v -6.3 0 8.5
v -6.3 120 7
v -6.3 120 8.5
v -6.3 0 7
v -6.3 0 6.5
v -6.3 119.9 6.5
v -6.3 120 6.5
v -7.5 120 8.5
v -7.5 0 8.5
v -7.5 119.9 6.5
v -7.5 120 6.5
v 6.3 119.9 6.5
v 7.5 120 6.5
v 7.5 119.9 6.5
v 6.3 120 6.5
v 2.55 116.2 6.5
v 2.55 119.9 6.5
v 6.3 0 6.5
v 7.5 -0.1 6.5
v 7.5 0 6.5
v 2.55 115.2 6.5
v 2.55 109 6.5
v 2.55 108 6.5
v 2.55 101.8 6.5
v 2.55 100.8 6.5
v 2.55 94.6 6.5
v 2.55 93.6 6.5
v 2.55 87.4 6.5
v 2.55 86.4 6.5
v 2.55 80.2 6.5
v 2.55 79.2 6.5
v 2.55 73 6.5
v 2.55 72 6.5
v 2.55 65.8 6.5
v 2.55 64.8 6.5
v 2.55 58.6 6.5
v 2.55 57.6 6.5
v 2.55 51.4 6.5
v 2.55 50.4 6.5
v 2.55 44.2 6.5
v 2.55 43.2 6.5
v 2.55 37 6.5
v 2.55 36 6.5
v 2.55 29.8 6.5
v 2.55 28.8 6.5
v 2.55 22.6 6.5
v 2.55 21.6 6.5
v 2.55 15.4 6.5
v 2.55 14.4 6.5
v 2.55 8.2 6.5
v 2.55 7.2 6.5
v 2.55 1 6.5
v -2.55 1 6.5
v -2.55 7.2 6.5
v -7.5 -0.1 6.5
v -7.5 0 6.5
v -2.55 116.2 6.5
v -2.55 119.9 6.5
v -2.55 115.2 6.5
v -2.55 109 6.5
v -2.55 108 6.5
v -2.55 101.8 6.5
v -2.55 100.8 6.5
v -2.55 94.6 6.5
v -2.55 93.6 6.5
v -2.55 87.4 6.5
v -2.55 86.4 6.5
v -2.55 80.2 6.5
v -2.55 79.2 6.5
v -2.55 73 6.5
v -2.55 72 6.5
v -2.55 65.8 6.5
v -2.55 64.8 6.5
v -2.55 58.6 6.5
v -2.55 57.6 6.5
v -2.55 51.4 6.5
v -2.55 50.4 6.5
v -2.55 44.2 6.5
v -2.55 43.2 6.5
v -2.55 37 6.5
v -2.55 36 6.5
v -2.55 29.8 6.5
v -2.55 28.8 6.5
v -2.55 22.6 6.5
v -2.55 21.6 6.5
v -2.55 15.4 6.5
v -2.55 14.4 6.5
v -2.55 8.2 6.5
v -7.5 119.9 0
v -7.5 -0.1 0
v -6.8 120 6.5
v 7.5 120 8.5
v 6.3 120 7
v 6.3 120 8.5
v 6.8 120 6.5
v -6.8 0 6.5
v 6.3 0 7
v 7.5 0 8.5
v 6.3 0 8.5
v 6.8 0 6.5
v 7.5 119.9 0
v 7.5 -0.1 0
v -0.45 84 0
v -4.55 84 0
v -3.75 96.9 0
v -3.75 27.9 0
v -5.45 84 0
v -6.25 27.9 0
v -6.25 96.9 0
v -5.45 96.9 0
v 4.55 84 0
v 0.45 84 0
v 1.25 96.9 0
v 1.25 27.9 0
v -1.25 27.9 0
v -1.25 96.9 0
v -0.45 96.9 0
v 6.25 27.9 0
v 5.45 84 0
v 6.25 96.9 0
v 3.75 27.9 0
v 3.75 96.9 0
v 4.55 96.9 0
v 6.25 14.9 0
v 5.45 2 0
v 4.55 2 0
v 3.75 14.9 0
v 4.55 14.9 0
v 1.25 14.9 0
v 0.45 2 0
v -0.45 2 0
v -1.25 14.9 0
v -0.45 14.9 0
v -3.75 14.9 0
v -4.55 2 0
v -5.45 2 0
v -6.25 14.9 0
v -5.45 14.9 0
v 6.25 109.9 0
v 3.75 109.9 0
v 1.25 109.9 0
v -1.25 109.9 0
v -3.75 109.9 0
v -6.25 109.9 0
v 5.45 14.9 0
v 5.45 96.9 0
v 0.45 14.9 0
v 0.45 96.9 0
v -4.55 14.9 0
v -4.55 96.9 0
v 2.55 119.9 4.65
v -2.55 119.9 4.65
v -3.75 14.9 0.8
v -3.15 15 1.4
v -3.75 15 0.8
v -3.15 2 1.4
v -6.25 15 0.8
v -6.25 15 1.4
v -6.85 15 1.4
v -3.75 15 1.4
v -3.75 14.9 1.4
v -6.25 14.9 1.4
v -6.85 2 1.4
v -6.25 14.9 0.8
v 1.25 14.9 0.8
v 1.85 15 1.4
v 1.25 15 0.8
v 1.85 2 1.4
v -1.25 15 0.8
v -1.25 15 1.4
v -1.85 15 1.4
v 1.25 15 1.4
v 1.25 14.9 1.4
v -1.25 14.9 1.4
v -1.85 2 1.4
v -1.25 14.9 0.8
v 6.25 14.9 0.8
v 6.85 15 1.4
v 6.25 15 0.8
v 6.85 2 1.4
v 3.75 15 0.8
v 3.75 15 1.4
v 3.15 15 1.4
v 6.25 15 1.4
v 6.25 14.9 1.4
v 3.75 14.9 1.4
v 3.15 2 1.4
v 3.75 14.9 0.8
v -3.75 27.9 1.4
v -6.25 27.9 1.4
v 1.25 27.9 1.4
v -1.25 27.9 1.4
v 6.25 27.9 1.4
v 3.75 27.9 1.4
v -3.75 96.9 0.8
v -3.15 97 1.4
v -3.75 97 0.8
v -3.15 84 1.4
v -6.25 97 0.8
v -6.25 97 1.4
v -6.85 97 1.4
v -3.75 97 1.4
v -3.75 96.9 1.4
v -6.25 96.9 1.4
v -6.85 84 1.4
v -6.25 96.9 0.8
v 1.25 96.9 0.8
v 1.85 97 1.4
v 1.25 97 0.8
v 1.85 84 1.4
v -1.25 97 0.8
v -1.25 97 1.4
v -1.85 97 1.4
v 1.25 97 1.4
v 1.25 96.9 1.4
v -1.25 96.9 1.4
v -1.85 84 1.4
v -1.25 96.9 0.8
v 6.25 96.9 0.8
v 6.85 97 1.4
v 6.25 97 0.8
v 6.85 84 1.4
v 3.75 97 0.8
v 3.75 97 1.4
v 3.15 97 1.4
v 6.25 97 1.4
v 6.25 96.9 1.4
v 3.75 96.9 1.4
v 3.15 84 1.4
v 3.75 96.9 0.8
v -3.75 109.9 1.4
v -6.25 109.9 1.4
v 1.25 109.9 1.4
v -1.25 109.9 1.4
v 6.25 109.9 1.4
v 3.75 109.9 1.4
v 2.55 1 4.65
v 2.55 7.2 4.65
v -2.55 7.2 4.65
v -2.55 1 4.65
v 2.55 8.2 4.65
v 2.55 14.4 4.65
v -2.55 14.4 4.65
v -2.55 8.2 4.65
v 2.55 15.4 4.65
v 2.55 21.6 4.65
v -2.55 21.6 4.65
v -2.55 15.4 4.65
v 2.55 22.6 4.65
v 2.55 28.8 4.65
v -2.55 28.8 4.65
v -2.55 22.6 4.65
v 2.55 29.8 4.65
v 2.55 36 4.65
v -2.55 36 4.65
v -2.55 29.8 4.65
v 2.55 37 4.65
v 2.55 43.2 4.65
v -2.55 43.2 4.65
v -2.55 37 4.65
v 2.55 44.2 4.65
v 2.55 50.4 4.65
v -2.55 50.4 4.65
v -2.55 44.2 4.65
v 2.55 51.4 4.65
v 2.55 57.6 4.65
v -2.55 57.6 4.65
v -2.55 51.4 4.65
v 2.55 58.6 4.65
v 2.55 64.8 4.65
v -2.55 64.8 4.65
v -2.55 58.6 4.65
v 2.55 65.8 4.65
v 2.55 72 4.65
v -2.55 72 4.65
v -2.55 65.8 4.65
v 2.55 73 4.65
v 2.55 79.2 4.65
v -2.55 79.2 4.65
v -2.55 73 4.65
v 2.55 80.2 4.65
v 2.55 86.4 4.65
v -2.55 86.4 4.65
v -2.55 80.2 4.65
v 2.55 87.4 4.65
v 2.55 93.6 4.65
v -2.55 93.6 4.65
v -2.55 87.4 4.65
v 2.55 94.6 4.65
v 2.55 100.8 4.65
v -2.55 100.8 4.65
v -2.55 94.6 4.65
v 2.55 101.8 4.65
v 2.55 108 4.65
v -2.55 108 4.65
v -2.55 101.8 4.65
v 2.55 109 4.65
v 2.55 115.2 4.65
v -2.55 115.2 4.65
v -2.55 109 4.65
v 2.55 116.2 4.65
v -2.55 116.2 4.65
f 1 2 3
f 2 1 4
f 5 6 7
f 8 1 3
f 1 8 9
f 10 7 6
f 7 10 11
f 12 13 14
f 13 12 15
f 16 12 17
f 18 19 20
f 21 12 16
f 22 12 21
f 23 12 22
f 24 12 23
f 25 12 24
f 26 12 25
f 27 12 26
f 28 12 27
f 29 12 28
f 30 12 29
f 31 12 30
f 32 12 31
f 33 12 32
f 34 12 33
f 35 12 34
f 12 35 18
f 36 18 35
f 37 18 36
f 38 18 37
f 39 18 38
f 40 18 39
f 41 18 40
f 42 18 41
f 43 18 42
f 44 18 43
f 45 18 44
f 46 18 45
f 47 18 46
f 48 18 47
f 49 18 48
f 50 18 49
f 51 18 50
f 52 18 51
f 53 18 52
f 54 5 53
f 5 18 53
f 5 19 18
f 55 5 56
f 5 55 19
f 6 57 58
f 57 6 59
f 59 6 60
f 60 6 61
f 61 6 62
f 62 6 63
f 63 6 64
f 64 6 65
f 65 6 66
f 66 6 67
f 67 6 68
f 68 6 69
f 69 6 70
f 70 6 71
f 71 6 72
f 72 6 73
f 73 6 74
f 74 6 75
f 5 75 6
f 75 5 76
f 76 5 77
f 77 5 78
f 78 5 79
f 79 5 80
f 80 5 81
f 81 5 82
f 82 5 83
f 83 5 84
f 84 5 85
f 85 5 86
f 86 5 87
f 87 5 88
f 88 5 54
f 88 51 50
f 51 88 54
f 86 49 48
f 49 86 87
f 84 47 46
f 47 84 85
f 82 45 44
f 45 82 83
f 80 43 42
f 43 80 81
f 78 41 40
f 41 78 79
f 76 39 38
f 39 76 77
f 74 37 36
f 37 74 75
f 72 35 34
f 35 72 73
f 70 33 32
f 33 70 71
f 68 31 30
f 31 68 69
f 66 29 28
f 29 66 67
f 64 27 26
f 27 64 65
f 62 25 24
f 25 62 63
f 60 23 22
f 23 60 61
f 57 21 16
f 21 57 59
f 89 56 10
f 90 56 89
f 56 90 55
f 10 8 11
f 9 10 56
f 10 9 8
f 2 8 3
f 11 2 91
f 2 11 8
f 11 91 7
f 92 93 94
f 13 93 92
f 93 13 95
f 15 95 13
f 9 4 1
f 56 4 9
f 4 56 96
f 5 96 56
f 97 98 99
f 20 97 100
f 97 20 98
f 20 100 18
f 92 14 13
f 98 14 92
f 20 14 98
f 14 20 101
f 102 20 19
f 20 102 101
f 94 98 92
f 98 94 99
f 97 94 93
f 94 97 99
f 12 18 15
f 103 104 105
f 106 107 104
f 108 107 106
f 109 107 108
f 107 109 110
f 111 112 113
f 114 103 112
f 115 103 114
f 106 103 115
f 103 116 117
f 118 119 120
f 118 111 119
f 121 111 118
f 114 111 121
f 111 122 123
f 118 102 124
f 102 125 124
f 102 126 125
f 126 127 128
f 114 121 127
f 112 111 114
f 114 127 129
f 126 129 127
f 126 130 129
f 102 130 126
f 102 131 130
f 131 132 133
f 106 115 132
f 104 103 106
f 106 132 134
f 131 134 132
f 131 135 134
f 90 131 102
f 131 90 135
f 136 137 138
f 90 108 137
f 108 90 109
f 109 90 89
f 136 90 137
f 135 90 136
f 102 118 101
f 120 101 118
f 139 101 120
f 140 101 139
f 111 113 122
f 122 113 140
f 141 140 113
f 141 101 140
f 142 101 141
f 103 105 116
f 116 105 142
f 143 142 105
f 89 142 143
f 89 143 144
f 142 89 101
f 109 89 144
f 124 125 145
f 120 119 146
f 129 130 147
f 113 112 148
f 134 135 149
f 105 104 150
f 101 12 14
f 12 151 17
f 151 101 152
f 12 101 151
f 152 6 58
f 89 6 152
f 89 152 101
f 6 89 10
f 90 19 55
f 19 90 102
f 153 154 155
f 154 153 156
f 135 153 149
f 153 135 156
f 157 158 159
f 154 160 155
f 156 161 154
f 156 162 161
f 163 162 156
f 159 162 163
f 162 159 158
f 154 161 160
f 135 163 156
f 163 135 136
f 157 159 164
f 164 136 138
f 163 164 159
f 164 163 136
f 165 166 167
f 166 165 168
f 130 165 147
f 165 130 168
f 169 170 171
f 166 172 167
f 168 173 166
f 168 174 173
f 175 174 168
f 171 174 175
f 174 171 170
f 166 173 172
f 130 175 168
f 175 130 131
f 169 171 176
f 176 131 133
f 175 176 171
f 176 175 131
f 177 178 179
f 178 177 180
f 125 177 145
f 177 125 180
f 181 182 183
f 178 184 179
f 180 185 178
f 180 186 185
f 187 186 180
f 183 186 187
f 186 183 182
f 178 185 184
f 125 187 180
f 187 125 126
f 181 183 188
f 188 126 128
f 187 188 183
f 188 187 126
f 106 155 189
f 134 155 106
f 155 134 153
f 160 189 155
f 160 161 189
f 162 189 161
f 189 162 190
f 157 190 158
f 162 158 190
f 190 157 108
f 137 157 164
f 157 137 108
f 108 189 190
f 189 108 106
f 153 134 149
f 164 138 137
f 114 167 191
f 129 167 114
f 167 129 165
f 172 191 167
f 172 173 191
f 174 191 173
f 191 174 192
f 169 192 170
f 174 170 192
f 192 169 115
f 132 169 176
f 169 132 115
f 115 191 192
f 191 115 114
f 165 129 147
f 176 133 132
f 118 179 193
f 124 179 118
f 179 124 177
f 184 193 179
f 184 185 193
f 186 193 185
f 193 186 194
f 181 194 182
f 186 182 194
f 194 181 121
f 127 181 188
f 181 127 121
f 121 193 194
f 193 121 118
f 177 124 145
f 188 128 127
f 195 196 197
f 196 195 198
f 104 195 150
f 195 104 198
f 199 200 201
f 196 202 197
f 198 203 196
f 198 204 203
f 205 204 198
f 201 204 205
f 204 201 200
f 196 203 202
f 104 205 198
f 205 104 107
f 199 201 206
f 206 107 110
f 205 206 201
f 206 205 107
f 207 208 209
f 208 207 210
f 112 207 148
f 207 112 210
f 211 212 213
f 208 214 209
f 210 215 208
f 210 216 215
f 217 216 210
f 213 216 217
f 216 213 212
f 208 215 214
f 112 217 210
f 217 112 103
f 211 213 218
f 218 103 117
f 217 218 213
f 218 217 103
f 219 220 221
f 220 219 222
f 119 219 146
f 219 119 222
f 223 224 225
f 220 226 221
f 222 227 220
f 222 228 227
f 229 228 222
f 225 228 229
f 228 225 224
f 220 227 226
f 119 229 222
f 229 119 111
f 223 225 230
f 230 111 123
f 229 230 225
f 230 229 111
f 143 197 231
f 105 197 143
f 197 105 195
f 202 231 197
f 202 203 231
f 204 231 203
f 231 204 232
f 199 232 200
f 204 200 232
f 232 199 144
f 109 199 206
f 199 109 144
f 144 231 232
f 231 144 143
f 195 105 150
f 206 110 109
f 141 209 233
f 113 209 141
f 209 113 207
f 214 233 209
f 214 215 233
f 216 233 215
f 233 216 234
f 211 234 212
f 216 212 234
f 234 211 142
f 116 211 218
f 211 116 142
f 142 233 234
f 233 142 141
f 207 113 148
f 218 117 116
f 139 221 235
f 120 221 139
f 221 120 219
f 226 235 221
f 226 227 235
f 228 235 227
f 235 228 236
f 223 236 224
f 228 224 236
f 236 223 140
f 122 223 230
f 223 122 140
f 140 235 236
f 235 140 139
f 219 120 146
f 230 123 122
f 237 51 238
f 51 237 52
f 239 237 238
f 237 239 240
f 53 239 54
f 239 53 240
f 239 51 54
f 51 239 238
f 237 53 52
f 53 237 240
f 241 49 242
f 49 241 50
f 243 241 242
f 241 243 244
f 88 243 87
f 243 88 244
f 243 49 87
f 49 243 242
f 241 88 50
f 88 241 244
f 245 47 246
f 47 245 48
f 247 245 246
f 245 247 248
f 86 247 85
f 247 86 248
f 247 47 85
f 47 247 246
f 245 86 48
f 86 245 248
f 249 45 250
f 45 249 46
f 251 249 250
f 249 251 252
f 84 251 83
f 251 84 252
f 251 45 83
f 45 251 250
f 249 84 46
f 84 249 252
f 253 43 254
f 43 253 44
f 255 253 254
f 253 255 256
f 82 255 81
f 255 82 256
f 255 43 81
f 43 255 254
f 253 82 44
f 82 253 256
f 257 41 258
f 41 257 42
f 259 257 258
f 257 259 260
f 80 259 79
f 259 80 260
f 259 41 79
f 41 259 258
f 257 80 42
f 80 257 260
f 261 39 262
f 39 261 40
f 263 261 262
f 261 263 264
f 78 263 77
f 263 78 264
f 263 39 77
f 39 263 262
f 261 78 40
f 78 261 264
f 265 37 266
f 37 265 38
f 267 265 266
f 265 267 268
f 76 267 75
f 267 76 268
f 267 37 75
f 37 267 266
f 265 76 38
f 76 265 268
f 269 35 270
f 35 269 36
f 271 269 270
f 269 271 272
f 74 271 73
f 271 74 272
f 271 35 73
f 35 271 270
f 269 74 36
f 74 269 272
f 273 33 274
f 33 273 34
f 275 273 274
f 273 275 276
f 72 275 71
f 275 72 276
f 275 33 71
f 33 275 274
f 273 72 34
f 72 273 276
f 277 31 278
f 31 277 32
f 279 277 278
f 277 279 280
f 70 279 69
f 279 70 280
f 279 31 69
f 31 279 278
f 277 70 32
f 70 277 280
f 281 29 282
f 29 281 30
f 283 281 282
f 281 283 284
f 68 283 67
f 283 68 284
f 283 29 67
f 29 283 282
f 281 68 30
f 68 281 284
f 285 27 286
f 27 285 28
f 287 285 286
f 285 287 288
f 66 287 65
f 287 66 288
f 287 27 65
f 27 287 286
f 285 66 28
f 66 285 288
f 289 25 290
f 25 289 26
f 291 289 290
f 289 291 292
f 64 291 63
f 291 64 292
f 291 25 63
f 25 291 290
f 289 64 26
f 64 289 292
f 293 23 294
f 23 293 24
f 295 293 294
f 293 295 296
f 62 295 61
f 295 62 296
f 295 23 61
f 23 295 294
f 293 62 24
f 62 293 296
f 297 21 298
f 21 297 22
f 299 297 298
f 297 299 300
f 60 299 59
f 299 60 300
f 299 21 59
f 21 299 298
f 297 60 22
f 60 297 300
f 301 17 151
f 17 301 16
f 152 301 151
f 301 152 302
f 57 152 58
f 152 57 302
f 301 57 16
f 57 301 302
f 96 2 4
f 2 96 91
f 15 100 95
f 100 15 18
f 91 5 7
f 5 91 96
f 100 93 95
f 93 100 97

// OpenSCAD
render_lid = false;
render_tray = true;

carrier_width_mm = 15;
carrier_length_mm = 120;
carrier_height_mm = 6.5;

// Set pocket definitions here:
pocket_to_next_mm = 1; // spacing between like pockets
pocket_to_pocket_mm = 1; // spacking between different pockets

// width, length, depth
pockets = [
    [10.5,  7.8, 4.55 + 0.1], // OLP-000049 - 6-SMD DIP
    [8.75,  6.2, 1.75 + 0.1], // OLp-000055 - 14-SOIC
    [ 5.1,  6.2, 1.75 + 0.1], // OLp-000055 - 8-SOIC
];


pocket = pockets[2];
wall_width_mm = 1.2;


// === Dovetail Profile (2D)
module dovetail_profile(dovetail_angle =  45,     // Degrees
                        dovetail_depth =   1,     // Vertical height
                        dovetail_width = 0.5,     // Bottom (narrow) width
                        ) {
    // How much wider top is than bottom
    half_top_extra = dovetail_depth * tan(dovetail_angle);  
    
    polygon([
        [0, 0],
        [dovetail_width, 0],
        [dovetail_width + half_top_extra, dovetail_depth],
        [-half_top_extra, dovetail_depth]
    ]);
}

// === Dovetail Slot
module dovetail(dovetail_length_mm = 12,
                dovetail_angle = 45,      // Degrees
                dovetail_depth = 1.6,       // Vertical height
                dovetail_width = 0.5,      // Bottom (narrow) width
            ) {
    
    translate([-dovetail_width/2,dovetail_length_mm,-0.1])
    rotate([90,0,0])
        linear_extrude(height = dovetail_length_mm)
            dovetail_profile(dovetail_angle,dovetail_depth,dovetail_width);
    
}

module menlu_dovetail() {
    dovetail_length_mm = 13;  // Extrusion thickness (e.g., length of slot)
    dovetail_z_offset_mm = -0.1;
    inter_dovetail_mm = 5;
    

    translate([-inter_dovetail_mm, 0, dovetail_z_offset_mm])
        dovetail(dovetail_length_mm);
    translate([0, 0, dovetail_z_offset_mm])
        dovetail(dovetail_length_mm);
    translate([inter_dovetail_mm, 0, dovetail_z_offset_mm])
        dovetail(dovetail_length_mm);

    keyhole_width_mm = 2.5;
    keyhole_height_mm = 1.5;
    translate([-5, dovetail_length_mm-0.1, -0.1])
        translate([-keyhole_width_mm/2,0,0])
            cube([keyhole_width_mm,dovetail_length_mm,keyhole_height_mm]);
    translate([0, dovetail_length_mm-0.1, -0.1])
        translate([-keyhole_width_mm/2,0,0])
            cube([keyhole_width_mm,dovetail_length_mm,keyhole_height_mm]);
    translate([5, dovetail_length_mm-0.1, -0.1])
        translate([-keyhole_width_mm/2,0,0])
            cube([keyhole_width_mm,dovetail_length_mm,keyhole_height_mm]);

}

//////////////////////////////
// Render Tray
//////////////////////////////
if(render_tray == true){
    difference(){
        union(){
            // tray body
            translate([-carrier_width_mm/2,-0.1, 0])
                cube([carrier_width_mm, carrier_length_mm, carrier_height_mm]);
            // tray walls
            translate([0,0,carrier_height_mm]){
                translate([-carrier_width_mm/2 + wall_width_mm/2,0,0])
                    translate([-wall_width_mm/2,0,0])
                        cube([wall_width_mm,carrier_length_mm, 2]);

                translate([carrier_width_mm/2 - wall_width_mm/2,0,0])
                    translate([-wall_width_mm/2,0,0])
                        cube([wall_width_mm,carrier_length_mm, 2]);
            }
        }

        // Menlu Keyway Cutouts
        color("blue")
        translate([0,2,0]){
            translate([0, 0,0])
                menlu_dovetail();
            translate([0, 82,0])
                menlu_dovetail();
        }

        // part pockets
        color("red")
        for( p = [pocket_to_next_mm : pocket[1] + pocket_to_next_mm : carrier_length_mm])
            translate([-pocket[0]/2,p,carrier_height_mm - pocket[2] ])
                cube(pocket);

        // lid cutout
        color("green")
        translate([0,0,carrier_height_mm +1])
            rotate([0,180,0])
                dovetail(dovetail_length_mm = carrier_length_mm,
                        dovetail_angle = 45,
                        dovetail_depth = 1.1,
                        dovetail_width = carrier_width_mm - (3 * wall_width_mm)
                    );

    }
}



//////////////////////////////
// Render Lid
//////////////////////////////
if(render_lid == true){
    // lid cutout
    color("green")
        translate([0,0,carrier_height_mm +1])
        difference() {
            rotate([0,180,0])
                dovetail(dovetail_length_mm = carrier_length_mm,
                        dovetail_angle = 45,
                        dovetail_depth = 1.1,
                        dovetail_width = carrier_width_mm - (3 * wall_width_mm)
                    );

            window_percentage = 0.90;
            translate([-1,carrier_length_mm * (1-window_percentage) / 2, -3])
            cube([2,carrier_length_mm * window_percentage, 4]);

        }
}
